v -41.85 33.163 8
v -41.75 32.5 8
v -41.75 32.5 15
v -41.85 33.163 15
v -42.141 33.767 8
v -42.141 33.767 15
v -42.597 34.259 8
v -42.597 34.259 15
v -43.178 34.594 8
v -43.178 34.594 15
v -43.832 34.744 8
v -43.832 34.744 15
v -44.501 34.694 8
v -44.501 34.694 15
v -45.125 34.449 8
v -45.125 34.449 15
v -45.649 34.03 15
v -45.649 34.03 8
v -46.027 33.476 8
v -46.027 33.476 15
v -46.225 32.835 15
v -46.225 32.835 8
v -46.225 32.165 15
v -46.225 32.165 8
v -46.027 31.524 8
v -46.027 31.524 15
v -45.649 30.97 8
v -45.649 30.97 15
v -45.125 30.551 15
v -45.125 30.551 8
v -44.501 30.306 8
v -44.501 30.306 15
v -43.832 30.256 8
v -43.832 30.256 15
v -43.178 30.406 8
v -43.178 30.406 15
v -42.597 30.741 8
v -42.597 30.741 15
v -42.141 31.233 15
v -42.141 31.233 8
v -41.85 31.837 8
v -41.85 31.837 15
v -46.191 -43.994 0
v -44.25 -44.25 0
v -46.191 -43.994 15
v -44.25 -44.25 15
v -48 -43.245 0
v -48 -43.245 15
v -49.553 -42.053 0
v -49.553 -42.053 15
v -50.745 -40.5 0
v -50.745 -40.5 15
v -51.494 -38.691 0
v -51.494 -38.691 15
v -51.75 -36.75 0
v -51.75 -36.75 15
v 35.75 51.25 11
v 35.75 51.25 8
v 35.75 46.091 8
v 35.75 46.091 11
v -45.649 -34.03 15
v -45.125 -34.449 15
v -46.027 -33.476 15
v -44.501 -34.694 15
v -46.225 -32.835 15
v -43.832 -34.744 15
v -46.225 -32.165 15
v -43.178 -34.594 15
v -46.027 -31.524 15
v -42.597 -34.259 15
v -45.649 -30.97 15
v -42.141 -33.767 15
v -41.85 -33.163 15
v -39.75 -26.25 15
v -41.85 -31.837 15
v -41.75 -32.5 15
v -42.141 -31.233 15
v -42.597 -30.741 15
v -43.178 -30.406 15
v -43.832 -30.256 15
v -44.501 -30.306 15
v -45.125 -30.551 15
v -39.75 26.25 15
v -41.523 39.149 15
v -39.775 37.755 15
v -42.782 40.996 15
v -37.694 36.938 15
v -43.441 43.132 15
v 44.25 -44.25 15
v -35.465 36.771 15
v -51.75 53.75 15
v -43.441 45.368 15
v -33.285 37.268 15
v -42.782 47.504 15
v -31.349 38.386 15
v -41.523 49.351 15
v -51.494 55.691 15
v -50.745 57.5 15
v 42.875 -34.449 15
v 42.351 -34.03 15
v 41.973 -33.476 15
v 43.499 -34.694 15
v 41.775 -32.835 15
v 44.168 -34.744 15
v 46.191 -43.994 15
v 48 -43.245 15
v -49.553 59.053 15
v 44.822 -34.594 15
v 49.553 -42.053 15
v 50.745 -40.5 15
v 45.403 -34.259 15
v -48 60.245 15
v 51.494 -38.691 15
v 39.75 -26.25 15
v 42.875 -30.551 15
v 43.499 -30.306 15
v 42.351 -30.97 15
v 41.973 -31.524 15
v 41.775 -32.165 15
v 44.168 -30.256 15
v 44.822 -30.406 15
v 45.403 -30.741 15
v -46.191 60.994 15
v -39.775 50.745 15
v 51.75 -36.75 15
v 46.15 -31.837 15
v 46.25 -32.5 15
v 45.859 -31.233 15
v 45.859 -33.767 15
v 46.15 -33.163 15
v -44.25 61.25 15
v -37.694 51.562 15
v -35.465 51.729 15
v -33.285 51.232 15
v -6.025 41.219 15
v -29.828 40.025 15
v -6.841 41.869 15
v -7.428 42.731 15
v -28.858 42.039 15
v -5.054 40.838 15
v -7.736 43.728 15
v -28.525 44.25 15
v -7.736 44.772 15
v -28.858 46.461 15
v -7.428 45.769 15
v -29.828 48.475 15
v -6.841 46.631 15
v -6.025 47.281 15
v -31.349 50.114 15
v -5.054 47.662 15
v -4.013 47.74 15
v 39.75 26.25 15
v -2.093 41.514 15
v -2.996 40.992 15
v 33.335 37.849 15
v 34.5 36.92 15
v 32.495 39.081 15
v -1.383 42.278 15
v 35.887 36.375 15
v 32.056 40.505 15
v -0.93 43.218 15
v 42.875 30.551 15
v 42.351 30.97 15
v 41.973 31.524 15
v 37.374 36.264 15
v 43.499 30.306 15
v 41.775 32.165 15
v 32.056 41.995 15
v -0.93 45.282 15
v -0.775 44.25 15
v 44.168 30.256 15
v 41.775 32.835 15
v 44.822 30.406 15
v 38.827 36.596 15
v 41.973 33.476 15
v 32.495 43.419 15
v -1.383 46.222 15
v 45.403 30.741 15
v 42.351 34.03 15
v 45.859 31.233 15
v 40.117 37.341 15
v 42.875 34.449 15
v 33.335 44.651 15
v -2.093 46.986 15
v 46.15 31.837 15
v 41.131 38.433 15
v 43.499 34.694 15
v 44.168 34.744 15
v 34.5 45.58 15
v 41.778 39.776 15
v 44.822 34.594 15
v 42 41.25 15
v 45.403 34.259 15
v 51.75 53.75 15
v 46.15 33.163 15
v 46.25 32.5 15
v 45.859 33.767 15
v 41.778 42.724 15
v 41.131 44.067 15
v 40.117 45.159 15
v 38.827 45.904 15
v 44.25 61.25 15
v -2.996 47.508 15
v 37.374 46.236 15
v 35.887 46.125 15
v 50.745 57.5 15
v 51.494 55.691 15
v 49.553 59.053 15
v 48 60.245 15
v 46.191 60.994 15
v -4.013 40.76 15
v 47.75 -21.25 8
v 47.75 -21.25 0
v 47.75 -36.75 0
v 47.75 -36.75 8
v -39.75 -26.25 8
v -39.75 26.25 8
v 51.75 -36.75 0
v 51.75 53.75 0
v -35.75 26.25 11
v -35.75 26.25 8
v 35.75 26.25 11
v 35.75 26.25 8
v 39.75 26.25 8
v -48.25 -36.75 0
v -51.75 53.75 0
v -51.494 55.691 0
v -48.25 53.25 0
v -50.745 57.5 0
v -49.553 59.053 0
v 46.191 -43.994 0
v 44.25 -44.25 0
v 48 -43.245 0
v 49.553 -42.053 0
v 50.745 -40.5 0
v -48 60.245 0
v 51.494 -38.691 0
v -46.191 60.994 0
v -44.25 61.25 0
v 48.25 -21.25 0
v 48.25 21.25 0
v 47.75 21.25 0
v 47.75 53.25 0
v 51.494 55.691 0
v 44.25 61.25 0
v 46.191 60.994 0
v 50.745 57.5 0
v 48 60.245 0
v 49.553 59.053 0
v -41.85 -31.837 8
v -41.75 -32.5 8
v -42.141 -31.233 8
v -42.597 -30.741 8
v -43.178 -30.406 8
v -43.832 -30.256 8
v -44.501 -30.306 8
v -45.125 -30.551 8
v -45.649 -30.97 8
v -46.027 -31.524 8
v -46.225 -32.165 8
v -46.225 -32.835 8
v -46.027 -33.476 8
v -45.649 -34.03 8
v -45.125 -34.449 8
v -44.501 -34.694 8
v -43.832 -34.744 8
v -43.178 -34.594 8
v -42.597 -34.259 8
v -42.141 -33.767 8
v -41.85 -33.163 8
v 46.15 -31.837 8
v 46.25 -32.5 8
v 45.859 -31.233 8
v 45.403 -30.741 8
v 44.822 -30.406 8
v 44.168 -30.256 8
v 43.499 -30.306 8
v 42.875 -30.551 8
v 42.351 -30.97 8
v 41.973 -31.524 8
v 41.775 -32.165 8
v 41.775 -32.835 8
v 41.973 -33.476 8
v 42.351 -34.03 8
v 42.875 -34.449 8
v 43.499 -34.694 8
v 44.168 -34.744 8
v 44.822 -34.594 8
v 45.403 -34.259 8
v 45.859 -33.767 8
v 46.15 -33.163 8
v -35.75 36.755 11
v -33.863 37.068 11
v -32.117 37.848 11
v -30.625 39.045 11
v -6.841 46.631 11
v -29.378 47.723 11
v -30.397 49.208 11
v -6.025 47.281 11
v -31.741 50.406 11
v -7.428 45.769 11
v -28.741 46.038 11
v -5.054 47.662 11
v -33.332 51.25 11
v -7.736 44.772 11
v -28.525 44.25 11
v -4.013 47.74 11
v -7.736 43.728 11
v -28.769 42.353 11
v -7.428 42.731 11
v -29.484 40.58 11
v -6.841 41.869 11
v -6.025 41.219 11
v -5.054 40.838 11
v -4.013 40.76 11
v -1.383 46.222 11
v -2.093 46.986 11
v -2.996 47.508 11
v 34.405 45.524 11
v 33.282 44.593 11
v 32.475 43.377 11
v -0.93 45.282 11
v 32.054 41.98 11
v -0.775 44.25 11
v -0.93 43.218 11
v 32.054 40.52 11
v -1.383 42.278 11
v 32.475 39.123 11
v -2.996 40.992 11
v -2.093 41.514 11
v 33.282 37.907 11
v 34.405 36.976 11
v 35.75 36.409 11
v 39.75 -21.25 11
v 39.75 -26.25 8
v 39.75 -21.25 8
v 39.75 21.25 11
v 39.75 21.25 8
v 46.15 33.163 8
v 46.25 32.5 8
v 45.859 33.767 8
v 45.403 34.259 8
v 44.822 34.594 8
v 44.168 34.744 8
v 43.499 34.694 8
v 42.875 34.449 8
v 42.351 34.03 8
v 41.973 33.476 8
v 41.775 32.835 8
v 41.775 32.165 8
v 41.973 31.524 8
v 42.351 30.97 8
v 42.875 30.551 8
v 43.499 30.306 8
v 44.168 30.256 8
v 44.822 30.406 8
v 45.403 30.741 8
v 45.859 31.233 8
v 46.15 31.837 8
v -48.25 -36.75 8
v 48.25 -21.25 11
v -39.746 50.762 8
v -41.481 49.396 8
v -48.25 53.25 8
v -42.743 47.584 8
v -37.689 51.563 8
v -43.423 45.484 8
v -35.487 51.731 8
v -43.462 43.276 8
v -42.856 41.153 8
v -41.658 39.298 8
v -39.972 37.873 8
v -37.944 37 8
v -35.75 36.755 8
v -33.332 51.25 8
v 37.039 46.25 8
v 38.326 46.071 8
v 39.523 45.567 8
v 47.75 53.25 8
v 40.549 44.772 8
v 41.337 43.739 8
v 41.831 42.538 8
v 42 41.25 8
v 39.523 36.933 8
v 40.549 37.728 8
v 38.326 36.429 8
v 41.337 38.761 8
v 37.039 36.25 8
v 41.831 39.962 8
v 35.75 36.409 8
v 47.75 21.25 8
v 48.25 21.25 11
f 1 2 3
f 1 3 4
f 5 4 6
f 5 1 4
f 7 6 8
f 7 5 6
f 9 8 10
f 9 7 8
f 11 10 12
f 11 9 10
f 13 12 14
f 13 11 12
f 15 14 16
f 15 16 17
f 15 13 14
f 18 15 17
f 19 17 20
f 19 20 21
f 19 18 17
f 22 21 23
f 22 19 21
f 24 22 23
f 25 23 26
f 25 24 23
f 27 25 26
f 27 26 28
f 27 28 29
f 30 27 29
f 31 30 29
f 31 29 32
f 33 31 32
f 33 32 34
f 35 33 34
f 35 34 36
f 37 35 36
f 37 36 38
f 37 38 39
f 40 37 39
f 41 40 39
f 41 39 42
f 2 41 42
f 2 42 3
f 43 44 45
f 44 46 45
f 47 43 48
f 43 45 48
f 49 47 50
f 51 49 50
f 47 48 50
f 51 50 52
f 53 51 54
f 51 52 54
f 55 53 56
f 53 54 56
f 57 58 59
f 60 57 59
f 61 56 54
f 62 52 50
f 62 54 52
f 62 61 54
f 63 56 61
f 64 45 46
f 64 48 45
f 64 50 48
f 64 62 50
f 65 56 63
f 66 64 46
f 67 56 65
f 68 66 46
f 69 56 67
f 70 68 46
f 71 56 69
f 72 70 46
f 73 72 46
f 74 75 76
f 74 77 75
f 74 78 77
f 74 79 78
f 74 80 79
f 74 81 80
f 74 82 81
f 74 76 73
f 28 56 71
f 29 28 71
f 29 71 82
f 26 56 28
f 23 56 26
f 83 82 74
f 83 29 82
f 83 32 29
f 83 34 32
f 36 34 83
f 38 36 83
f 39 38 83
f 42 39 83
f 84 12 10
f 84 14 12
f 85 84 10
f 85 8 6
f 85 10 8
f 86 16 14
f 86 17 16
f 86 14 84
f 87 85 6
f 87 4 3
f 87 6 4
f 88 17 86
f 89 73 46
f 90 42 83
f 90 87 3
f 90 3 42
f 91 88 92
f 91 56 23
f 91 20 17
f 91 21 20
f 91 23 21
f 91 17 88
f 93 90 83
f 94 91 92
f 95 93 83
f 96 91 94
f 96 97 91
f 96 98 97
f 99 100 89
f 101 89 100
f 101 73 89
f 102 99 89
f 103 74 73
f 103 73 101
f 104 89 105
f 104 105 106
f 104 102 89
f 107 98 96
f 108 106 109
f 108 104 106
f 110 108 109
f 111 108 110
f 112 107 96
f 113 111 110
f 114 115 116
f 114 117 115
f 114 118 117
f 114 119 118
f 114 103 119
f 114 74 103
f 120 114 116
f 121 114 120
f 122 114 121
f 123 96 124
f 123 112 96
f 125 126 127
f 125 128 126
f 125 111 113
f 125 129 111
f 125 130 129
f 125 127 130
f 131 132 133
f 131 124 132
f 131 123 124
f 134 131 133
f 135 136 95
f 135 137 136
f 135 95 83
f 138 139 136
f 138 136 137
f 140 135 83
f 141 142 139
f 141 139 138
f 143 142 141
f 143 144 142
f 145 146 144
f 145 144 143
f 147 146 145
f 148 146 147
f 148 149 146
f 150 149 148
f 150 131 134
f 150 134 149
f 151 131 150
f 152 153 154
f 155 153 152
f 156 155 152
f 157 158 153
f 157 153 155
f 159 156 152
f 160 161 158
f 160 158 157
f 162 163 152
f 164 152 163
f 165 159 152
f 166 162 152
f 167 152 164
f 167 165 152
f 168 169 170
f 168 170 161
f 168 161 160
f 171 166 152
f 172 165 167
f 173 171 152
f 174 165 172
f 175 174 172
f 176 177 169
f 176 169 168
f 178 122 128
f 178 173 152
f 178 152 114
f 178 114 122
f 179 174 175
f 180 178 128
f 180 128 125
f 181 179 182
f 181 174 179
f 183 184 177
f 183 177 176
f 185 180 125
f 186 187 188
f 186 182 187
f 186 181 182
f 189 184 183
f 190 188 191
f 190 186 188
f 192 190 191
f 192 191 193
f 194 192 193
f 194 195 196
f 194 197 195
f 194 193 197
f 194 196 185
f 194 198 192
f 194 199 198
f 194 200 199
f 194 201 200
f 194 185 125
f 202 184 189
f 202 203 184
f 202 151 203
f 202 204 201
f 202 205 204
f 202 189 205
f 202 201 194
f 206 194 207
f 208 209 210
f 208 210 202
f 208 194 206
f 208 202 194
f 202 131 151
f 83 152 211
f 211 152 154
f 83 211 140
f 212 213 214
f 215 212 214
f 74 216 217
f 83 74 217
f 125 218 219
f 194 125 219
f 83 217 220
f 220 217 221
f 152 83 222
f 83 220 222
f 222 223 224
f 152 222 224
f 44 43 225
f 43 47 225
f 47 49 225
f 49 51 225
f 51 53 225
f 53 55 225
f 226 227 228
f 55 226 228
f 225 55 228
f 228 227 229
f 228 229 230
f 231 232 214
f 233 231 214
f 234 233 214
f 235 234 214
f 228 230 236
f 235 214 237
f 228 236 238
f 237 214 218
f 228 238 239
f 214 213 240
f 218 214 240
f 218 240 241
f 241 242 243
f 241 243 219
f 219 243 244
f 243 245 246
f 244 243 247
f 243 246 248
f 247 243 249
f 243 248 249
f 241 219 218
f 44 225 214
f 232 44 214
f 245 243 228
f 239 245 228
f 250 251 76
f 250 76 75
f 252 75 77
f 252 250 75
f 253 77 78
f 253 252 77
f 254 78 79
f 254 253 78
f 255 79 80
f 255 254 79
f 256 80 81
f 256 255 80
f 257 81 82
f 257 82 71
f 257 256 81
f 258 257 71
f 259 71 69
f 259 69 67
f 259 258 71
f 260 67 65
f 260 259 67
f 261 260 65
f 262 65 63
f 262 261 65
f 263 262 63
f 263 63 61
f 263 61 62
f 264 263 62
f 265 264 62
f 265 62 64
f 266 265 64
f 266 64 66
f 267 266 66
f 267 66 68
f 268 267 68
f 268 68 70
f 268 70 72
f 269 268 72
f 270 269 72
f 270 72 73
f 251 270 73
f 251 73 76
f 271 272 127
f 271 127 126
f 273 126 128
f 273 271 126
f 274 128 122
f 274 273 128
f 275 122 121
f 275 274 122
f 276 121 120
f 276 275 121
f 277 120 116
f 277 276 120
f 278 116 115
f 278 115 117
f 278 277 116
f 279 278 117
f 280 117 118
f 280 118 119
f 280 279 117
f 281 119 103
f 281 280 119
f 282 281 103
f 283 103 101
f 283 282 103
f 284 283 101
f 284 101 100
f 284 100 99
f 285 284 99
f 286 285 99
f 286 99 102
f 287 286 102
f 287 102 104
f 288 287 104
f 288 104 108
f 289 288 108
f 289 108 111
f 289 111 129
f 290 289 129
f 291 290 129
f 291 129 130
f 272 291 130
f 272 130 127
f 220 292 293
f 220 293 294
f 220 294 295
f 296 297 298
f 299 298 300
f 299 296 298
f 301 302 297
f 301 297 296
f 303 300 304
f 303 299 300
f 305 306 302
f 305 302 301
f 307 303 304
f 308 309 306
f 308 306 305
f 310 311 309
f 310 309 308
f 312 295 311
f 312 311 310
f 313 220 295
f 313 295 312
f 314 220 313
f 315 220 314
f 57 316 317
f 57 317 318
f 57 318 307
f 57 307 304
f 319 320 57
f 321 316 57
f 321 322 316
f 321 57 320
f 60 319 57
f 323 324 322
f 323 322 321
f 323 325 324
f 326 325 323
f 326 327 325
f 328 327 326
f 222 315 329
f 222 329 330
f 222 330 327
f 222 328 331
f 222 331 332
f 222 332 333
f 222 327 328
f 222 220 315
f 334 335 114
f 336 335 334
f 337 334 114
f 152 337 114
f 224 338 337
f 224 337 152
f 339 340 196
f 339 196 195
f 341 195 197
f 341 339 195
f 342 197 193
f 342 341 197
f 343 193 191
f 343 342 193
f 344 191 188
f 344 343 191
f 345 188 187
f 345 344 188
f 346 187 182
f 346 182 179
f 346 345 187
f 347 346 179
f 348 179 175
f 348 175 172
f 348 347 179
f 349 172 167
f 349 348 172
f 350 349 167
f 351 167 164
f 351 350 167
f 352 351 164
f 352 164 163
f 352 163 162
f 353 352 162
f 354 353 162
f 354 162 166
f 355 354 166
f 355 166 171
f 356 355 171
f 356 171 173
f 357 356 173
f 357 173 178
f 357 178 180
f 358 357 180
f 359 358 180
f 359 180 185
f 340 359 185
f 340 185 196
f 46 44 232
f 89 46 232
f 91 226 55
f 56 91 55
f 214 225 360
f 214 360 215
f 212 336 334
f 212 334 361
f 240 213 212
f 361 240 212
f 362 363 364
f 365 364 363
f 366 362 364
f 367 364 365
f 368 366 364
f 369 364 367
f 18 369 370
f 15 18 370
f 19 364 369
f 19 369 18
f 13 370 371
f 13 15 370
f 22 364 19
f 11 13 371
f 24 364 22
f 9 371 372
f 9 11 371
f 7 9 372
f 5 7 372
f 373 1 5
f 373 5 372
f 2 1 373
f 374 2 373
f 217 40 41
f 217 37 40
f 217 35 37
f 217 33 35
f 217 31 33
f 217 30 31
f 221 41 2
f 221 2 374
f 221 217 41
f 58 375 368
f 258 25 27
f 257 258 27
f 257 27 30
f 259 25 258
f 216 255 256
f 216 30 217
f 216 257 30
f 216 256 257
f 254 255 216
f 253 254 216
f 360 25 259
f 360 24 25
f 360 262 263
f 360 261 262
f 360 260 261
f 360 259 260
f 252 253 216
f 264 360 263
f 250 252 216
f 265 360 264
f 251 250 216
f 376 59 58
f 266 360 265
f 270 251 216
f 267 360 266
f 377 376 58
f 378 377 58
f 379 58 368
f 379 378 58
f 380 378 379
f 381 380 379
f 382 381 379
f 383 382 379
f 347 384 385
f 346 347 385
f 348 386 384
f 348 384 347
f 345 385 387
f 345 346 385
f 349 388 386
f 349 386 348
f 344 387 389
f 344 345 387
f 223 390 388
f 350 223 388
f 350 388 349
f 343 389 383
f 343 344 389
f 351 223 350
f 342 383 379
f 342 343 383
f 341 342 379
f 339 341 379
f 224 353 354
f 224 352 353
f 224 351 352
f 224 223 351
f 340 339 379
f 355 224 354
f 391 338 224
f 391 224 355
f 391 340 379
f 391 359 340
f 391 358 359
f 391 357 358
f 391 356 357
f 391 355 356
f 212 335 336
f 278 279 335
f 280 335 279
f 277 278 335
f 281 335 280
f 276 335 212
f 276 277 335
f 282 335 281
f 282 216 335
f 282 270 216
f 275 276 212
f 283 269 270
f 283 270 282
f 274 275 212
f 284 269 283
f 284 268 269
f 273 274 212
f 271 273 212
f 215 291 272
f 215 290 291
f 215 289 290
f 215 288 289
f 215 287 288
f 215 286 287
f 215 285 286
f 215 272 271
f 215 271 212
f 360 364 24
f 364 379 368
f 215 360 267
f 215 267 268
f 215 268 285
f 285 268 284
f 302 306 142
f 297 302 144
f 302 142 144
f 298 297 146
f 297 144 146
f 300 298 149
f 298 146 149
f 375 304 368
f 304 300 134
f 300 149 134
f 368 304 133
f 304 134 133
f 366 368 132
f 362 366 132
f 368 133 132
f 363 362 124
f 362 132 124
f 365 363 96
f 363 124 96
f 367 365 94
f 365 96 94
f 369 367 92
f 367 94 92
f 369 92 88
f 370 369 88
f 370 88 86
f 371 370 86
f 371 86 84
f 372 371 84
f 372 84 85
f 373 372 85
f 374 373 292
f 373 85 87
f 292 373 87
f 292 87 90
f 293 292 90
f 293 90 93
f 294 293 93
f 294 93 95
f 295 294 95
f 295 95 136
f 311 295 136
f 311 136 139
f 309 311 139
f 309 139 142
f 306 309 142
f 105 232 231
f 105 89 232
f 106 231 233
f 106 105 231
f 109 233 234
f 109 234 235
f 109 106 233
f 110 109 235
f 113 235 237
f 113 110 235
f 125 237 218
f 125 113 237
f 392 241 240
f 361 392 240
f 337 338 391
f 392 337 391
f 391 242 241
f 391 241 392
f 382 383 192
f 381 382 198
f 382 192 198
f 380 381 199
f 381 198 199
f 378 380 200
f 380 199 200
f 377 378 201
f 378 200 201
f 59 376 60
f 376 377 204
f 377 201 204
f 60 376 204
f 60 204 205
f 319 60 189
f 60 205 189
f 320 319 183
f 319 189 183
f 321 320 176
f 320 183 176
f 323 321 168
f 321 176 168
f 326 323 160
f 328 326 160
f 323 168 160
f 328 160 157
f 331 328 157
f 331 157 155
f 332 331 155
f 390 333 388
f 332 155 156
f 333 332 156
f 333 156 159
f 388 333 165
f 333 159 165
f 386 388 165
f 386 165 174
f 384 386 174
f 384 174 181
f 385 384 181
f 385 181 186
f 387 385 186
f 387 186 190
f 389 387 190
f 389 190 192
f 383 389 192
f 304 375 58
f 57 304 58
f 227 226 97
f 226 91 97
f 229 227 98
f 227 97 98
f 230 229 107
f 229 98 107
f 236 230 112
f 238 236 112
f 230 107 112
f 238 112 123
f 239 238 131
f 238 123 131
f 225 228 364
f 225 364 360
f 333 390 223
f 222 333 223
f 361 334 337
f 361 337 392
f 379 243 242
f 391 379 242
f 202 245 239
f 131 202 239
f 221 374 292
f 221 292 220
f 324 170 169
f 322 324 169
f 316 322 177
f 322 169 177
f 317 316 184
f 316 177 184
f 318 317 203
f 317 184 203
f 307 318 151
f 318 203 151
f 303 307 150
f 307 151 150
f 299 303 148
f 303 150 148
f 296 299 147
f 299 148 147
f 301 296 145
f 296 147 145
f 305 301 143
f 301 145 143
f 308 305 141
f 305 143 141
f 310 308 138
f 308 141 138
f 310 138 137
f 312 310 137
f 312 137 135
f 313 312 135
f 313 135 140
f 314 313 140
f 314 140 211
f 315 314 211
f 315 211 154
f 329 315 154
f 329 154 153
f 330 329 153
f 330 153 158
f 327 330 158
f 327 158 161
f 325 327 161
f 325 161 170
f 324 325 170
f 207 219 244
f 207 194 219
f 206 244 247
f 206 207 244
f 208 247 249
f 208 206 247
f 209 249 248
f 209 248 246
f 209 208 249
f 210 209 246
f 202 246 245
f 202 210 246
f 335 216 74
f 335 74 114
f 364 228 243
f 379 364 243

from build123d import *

# Parameters (mm, degrees)
F0_R     = 2.25
F0_W     = 79.5
F0_H     = 52.5
F1_DEPTH = 15
F2_W     = 8.5
F2_H     = 42.5
F2_W_2   = 71.5
F2_H_2   = 25
F3_DEPTH = 11
F4_W     = 96
F4_H     = 90
F5_DEPTH = 8
F6_R     = 7.5
F6_R_2   = 3.5
F6_R_3   = 5
F7_DEPTH = 15.001
F8_R     = 7.5


with BuildPart() as f1:
    # F0 (on Top) → F1 (new body)
    with BuildSketch(Plane.XY):
        Polygon((-51.75, -9.25), (-51.75, -44.25), (51.75, -44.25), (51.75, 61.25), (11.75, 61.25), (-3.25, 61.25), (-51.75, 61.25), align=None)
        with Locations((-44, -32.5)):
            Circle(F0_R, mode=Mode.SUBTRACT)
        with Locations((44, -32.5)):
            Circle(F0_R, mode=Mode.SUBTRACT)
        Rectangle(F0_W, F0_H, mode=Mode.SUBTRACT)
        with Locations((-44, 32.5)):
            Circle(F0_R, mode=Mode.SUBTRACT)
        with Locations((44, 32.5)):
            Circle(F0_R, mode=Mode.SUBTRACT)
    extrude(amount=F1_DEPTH)

    # F2 (on face) → F3 (cut)
    with BuildSketch(Plane(origin=(0, 0, 0), x_dir=(1, 0, 0), z_dir=(0, 0, -1))):
        with Locations((44, 0)):
            Rectangle(F2_W, F2_H)
        with Locations((0, -38.75)):
            Rectangle(F2_W_2, F2_H_2)
    extrude(amount=-F3_DEPTH, mode=Mode.SUBTRACT)

    # F4 (on face) → F5 (cut)
    with BuildSketch(Plane(origin=(0, 0, 0), x_dir=(1, 0, 0), z_dir=(0, 0, -1))):
        with Locations((-0.25, -8.25)):
            Rectangle(F4_W, F4_H)
    extrude(amount=-F5_DEPTH, mode=Mode.SUBTRACT)

    # F6 (on face) → F7 (cut, through all)
    with BuildSketch(Plane.XY.offset(15)):
        with Locations((-36.025, 44.25)):
            Circle(F6_R)
        with Locations((-4.275, 44.25)):
            Circle(F6_R_2)
        with Locations((37, 41.25)):
            Circle(F6_R_3)
    extrude(amount=-F7_DEPTH, mode=Mode.SUBTRACT)

    # F8
    f8_edges = [f1.edges().sort_by_distance(p)[0] for p in [
        (51.75, -44.25, 7.5),
        (-51.75, 61.25, 7.5),
        (-51.75, -44.25, 7.5),
        (51.75, 61.25, 7.5),
    ]]
    fillet(f8_edges, radius=F8_R)


solid = f1.part
